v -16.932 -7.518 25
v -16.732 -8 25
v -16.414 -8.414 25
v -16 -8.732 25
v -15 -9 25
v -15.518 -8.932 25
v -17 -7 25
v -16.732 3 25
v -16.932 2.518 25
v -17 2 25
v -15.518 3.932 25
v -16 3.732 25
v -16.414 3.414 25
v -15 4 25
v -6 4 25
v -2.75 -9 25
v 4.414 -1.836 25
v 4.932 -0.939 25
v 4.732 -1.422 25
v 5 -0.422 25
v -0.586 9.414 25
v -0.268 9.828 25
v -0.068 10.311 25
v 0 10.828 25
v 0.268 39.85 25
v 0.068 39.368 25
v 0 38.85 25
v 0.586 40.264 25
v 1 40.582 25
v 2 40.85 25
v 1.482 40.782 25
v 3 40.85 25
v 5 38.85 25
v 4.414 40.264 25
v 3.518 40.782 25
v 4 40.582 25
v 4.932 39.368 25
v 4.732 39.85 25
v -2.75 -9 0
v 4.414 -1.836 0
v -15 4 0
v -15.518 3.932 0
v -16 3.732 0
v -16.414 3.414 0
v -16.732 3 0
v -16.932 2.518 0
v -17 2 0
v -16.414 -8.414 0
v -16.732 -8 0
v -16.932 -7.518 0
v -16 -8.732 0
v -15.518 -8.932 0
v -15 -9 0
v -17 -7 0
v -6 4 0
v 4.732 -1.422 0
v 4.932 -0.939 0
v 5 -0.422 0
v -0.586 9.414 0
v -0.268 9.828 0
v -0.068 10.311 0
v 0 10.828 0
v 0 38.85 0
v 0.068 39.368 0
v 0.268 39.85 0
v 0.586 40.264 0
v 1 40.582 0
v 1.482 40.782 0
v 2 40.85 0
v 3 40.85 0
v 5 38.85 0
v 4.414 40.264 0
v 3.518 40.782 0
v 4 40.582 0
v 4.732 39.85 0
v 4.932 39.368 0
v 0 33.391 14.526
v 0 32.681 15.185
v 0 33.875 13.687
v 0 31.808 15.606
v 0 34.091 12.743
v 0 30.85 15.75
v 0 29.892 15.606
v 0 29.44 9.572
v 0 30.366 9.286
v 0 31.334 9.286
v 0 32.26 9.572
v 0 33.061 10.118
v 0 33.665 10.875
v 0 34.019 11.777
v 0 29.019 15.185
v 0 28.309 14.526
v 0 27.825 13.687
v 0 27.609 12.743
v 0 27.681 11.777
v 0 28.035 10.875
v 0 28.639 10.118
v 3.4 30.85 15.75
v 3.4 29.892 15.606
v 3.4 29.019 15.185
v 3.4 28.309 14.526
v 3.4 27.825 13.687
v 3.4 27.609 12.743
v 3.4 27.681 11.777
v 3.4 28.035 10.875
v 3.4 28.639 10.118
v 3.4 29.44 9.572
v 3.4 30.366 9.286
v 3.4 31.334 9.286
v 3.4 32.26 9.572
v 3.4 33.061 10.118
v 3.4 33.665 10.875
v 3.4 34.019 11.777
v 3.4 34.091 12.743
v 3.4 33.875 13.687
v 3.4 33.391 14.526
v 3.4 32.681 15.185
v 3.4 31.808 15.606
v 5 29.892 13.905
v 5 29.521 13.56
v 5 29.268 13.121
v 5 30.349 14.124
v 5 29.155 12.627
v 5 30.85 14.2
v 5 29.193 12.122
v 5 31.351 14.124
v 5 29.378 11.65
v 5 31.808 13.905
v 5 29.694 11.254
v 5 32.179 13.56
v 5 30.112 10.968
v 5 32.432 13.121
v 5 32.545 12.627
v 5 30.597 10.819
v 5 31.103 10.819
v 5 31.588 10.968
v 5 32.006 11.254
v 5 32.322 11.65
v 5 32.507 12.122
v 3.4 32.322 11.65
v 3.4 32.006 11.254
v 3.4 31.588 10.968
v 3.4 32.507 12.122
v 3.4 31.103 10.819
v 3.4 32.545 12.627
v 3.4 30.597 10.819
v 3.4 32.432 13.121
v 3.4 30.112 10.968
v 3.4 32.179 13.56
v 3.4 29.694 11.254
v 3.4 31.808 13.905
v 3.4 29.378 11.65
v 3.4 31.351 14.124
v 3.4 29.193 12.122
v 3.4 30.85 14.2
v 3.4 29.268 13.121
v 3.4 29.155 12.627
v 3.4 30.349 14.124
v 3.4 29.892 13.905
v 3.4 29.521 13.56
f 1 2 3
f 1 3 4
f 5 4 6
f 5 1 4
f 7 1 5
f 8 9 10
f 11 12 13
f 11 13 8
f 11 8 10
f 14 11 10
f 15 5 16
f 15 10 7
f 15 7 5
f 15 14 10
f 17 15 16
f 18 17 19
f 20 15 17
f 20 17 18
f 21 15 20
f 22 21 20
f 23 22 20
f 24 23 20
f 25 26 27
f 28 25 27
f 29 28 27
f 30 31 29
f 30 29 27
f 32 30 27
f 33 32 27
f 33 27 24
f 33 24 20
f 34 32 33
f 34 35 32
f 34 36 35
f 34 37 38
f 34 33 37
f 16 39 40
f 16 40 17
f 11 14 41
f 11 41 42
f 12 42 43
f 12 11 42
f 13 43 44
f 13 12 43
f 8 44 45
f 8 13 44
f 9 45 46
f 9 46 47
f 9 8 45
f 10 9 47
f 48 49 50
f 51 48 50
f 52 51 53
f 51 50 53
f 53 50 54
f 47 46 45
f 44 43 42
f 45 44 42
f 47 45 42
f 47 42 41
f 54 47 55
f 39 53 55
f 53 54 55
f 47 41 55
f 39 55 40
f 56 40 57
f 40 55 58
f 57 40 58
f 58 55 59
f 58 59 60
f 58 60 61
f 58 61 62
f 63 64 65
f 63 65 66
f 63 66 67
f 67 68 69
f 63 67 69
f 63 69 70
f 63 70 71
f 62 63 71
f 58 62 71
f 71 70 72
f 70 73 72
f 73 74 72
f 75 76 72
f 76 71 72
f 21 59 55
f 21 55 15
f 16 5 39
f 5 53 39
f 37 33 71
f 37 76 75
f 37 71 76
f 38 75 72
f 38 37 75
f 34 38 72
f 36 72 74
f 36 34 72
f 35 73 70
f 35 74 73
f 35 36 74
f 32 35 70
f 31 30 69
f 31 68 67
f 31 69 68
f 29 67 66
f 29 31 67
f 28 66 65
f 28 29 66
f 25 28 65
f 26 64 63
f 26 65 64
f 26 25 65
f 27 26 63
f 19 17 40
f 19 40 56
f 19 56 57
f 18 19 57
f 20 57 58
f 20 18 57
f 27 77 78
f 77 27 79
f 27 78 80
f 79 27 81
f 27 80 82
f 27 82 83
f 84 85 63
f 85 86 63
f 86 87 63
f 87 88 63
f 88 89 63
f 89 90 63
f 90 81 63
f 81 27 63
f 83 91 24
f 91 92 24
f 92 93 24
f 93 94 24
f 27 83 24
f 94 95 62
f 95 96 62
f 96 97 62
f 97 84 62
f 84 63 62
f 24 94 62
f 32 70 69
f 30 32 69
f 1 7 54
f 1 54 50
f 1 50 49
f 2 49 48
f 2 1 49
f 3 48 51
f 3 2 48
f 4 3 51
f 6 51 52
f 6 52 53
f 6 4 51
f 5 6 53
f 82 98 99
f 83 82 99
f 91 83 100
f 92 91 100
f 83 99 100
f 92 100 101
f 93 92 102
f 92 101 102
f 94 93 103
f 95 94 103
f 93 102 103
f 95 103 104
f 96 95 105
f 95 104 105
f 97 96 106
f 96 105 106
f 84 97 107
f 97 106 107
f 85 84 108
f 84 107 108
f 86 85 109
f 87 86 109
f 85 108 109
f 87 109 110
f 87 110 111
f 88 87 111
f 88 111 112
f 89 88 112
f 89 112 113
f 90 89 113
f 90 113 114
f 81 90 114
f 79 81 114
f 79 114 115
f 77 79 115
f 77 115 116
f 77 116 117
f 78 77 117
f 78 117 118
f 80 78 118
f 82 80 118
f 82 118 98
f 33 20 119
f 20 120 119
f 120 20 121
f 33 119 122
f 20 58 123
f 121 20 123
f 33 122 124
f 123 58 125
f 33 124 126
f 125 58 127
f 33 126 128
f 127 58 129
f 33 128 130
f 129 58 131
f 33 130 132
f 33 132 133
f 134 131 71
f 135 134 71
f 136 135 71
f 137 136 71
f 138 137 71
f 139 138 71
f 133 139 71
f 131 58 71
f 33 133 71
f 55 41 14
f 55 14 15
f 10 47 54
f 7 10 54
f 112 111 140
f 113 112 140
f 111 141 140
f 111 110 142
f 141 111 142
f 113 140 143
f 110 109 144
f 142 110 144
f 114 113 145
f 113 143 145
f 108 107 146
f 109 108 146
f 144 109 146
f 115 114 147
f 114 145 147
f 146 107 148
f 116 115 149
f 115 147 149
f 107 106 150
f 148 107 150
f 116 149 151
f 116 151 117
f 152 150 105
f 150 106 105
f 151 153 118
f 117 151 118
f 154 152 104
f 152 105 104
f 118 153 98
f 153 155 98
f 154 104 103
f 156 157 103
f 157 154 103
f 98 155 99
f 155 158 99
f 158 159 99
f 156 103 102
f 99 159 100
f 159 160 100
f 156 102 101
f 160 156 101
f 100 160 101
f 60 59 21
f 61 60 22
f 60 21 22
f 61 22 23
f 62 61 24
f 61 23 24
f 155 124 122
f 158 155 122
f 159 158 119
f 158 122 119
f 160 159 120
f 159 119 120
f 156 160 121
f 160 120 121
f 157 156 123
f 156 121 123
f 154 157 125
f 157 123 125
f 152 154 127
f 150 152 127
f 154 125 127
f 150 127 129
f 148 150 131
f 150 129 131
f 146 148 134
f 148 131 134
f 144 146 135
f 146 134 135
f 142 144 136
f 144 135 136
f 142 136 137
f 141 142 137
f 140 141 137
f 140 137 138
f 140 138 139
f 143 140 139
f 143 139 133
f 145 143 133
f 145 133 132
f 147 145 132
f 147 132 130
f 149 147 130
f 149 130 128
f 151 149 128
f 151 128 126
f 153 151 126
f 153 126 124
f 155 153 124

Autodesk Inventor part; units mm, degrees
ref_plane "YZ Plane" through (0, 0, 0) normal (1, 0, 0) x (0, 1, 0)
ref_plane "XZ Plane" through (0, 0, 0) normal (0, 1, 0) x (-1, 0, 0)
ref_plane "XY Plane" through (0, 0, 0) normal (0, 0, 1) x (1, 0, 0)
sketch "Sketch1" plane through (0, 0, 0) normal (0, 0, 1) x (1, 0, 0)
  line L0 (0, 40.85) -> (0, 0)
  line L1 (0, 0) -> (-17, 0)
  line L2 (-17, 0) -> (-17, -5)
  line L3 (-17, -5) -> (5, -5)
  line L4 (5, -5) -> (5, 40.85)
  line L5 (5, 40.85) -> (0, 40.85)
  line L6 (-17, 0) -> (-17, 4)
  line L7 (-17, 4) -> (-15, 4)
  line L8 (-15, 4) -> (-15, 0)
  line L9 (-17, -5) -> (-17, -9)
  line L10 (-17, -9) -> (-15, -9)
  line L11 (-15, -9) -> (-15, -5)
  line L12 (-9, 0) -> (-9, 4)
  line L13 (-9, 4) -> (0, 4)
  line L14 (-9, -5) -> (-9, -9)
  line L15 (-9, -9) -> (5, -9)
  line L16 (5, -9) -> (5, -5)
  line L17 (-15, 4) -> (-9, 4)
  line L18 (-15, -9) -> (-9, -9)
  dimension "d0" = 5
  dimension "d1" = 15
  dimension "d2" = 4
  dimension "d3" = 2
  dimension "d4" = 40.85
  dimension "d5" = 6
extrude "Extrusion1" add sketch "Sketch1" along normal blind 25
sketch "Sketch2" plane through (-17, 4, 0) normal (0, 1, 0) x (1, 0, 0)
  circle A0 centre (-1.4373, -213.5) radius 4.5 projected
  line L0 (16.4159, -222.1385) -> (44.0445, -254.6126)
  line L1 (44.0445, -254.6126) -> (38.713, -259.1485)
  line L2 (38.713, -259.1485) -> (11.0845, -226.6745)
  line L3 (11.0845, -226.6745) -> (16.4159, -222.1385)
  line L4 (1.9901, -210.584) -> (-347.6847, 200.416)
  circle A1 centre (-351.112, 197.5) radius 4.5 projected
  point P0 (17, 0)
  point P1 (41.3788, -256.8805)
  dimension "d8" = 7
extrude "Extrusion2" cut sketch "Sketch2" against normal blind 3 contours L0 L1 L2 L3
sketch "Sketch3" plane through (-17, -9, 0) normal (0, -1, 0) x (1, 0, 0)
  line L0 (1.9991, 25) -> (2.3222, 0) projected
  line L1 (9.3228, 0) -> (8.9997, 25) projected
  line L2 (22, 225.4393) -> (22, 219.5607) construction
  line L3 (22, 225.4393) -> (-378, 225.4393) construction
  line L4 (-378, 219.5607) -> (-378, 225.4393) construction
  line L5 (22, 219.5607) -> (-378, 219.5607) construction
  circle A0 centre (6.5, 222.5) radius 4.5 construction
  line L6 (-355.6868, -191.4906) -> (9.8625, 219.5094) construction
  line L7 (70.9842, 282.9643) -> (65.7537, 287.6164)
  line L8 (65.7537, 287.6164) -> (-8.4745, 204.1589)
  line L9 (-8.4745, 204.1589) -> (-3.244, 199.5068)
  line L10 (-3.244, 199.5068) -> (70.9842, 282.9643)
  line L11 (2.3222, 0) -> (9.3228, 0) projected
  line L12 (8.9997, 25) -> (1.9991, 25) projected
  circle A1 centre (-359.0493, -188.5) radius 4.5 projected
  point P0 (17, 0)
  point P1 (68.369, 285.2903)
  dimension "d38" = 7
extrude "Extrusion3" cut sketch "Sketch3" against normal blind 3 contours L10 L9 L8 L7
chamfer "Chamfer1" distance 7.75 angle 45 1 edges at (5, -9, 12.5)
chamfer "Chamfer3" distance 6 angle 45 1 edges at (0, 4, 12.5)
sketch "Sketch5" plane through (0, 40.85, 0) normal (-1, 0, 0) x (0, 0, 1)
  line L0 (212.5, -7.0607) -> (212.5, -12.9393) projected
  line L1 (-187.5, -7.0607) -> (212.5, -7.0607) projected
  line L2 (-187.5, -12.9393) -> (-187.5, -7.0607) projected
  line L3 (-187.5, -12.9393) -> (212.5, -12.9393) projected
  line L4 (12.5, -7.0607) -> (12.5, -12.9393) construction
  line L5 (12.5, -10) -> (25, -10) construction
  line L6 (25, -42.1) -> (25, 0) projected
  line L7 (12.5, -10) -> (0, -10) construction
  line L8 (0, -42.1) -> (0, 0) projected
  point P0 (0, -40.85)
hole "Hole1" at (0, 30.85, 12.5) direction (1, 0, 0) diameter 3.4 end through all counterbore diameter 6.5 counterbore depth 3.4 clearance for "Socket Head Cap Screw ISO 4762" size "M3" standard "ISO"
fillet "Fillet3" radius 2 6 edges at (-17, 4, 12.5) (-17, -9, 12.5) (5, -1.25, 12.5) (0, 10, 12.5) (5, 40.85, 12.5) (0, 40.85, 12.5)
chamfer "Chamfer4" [suppressed]
properties part number "belt no touchy"
